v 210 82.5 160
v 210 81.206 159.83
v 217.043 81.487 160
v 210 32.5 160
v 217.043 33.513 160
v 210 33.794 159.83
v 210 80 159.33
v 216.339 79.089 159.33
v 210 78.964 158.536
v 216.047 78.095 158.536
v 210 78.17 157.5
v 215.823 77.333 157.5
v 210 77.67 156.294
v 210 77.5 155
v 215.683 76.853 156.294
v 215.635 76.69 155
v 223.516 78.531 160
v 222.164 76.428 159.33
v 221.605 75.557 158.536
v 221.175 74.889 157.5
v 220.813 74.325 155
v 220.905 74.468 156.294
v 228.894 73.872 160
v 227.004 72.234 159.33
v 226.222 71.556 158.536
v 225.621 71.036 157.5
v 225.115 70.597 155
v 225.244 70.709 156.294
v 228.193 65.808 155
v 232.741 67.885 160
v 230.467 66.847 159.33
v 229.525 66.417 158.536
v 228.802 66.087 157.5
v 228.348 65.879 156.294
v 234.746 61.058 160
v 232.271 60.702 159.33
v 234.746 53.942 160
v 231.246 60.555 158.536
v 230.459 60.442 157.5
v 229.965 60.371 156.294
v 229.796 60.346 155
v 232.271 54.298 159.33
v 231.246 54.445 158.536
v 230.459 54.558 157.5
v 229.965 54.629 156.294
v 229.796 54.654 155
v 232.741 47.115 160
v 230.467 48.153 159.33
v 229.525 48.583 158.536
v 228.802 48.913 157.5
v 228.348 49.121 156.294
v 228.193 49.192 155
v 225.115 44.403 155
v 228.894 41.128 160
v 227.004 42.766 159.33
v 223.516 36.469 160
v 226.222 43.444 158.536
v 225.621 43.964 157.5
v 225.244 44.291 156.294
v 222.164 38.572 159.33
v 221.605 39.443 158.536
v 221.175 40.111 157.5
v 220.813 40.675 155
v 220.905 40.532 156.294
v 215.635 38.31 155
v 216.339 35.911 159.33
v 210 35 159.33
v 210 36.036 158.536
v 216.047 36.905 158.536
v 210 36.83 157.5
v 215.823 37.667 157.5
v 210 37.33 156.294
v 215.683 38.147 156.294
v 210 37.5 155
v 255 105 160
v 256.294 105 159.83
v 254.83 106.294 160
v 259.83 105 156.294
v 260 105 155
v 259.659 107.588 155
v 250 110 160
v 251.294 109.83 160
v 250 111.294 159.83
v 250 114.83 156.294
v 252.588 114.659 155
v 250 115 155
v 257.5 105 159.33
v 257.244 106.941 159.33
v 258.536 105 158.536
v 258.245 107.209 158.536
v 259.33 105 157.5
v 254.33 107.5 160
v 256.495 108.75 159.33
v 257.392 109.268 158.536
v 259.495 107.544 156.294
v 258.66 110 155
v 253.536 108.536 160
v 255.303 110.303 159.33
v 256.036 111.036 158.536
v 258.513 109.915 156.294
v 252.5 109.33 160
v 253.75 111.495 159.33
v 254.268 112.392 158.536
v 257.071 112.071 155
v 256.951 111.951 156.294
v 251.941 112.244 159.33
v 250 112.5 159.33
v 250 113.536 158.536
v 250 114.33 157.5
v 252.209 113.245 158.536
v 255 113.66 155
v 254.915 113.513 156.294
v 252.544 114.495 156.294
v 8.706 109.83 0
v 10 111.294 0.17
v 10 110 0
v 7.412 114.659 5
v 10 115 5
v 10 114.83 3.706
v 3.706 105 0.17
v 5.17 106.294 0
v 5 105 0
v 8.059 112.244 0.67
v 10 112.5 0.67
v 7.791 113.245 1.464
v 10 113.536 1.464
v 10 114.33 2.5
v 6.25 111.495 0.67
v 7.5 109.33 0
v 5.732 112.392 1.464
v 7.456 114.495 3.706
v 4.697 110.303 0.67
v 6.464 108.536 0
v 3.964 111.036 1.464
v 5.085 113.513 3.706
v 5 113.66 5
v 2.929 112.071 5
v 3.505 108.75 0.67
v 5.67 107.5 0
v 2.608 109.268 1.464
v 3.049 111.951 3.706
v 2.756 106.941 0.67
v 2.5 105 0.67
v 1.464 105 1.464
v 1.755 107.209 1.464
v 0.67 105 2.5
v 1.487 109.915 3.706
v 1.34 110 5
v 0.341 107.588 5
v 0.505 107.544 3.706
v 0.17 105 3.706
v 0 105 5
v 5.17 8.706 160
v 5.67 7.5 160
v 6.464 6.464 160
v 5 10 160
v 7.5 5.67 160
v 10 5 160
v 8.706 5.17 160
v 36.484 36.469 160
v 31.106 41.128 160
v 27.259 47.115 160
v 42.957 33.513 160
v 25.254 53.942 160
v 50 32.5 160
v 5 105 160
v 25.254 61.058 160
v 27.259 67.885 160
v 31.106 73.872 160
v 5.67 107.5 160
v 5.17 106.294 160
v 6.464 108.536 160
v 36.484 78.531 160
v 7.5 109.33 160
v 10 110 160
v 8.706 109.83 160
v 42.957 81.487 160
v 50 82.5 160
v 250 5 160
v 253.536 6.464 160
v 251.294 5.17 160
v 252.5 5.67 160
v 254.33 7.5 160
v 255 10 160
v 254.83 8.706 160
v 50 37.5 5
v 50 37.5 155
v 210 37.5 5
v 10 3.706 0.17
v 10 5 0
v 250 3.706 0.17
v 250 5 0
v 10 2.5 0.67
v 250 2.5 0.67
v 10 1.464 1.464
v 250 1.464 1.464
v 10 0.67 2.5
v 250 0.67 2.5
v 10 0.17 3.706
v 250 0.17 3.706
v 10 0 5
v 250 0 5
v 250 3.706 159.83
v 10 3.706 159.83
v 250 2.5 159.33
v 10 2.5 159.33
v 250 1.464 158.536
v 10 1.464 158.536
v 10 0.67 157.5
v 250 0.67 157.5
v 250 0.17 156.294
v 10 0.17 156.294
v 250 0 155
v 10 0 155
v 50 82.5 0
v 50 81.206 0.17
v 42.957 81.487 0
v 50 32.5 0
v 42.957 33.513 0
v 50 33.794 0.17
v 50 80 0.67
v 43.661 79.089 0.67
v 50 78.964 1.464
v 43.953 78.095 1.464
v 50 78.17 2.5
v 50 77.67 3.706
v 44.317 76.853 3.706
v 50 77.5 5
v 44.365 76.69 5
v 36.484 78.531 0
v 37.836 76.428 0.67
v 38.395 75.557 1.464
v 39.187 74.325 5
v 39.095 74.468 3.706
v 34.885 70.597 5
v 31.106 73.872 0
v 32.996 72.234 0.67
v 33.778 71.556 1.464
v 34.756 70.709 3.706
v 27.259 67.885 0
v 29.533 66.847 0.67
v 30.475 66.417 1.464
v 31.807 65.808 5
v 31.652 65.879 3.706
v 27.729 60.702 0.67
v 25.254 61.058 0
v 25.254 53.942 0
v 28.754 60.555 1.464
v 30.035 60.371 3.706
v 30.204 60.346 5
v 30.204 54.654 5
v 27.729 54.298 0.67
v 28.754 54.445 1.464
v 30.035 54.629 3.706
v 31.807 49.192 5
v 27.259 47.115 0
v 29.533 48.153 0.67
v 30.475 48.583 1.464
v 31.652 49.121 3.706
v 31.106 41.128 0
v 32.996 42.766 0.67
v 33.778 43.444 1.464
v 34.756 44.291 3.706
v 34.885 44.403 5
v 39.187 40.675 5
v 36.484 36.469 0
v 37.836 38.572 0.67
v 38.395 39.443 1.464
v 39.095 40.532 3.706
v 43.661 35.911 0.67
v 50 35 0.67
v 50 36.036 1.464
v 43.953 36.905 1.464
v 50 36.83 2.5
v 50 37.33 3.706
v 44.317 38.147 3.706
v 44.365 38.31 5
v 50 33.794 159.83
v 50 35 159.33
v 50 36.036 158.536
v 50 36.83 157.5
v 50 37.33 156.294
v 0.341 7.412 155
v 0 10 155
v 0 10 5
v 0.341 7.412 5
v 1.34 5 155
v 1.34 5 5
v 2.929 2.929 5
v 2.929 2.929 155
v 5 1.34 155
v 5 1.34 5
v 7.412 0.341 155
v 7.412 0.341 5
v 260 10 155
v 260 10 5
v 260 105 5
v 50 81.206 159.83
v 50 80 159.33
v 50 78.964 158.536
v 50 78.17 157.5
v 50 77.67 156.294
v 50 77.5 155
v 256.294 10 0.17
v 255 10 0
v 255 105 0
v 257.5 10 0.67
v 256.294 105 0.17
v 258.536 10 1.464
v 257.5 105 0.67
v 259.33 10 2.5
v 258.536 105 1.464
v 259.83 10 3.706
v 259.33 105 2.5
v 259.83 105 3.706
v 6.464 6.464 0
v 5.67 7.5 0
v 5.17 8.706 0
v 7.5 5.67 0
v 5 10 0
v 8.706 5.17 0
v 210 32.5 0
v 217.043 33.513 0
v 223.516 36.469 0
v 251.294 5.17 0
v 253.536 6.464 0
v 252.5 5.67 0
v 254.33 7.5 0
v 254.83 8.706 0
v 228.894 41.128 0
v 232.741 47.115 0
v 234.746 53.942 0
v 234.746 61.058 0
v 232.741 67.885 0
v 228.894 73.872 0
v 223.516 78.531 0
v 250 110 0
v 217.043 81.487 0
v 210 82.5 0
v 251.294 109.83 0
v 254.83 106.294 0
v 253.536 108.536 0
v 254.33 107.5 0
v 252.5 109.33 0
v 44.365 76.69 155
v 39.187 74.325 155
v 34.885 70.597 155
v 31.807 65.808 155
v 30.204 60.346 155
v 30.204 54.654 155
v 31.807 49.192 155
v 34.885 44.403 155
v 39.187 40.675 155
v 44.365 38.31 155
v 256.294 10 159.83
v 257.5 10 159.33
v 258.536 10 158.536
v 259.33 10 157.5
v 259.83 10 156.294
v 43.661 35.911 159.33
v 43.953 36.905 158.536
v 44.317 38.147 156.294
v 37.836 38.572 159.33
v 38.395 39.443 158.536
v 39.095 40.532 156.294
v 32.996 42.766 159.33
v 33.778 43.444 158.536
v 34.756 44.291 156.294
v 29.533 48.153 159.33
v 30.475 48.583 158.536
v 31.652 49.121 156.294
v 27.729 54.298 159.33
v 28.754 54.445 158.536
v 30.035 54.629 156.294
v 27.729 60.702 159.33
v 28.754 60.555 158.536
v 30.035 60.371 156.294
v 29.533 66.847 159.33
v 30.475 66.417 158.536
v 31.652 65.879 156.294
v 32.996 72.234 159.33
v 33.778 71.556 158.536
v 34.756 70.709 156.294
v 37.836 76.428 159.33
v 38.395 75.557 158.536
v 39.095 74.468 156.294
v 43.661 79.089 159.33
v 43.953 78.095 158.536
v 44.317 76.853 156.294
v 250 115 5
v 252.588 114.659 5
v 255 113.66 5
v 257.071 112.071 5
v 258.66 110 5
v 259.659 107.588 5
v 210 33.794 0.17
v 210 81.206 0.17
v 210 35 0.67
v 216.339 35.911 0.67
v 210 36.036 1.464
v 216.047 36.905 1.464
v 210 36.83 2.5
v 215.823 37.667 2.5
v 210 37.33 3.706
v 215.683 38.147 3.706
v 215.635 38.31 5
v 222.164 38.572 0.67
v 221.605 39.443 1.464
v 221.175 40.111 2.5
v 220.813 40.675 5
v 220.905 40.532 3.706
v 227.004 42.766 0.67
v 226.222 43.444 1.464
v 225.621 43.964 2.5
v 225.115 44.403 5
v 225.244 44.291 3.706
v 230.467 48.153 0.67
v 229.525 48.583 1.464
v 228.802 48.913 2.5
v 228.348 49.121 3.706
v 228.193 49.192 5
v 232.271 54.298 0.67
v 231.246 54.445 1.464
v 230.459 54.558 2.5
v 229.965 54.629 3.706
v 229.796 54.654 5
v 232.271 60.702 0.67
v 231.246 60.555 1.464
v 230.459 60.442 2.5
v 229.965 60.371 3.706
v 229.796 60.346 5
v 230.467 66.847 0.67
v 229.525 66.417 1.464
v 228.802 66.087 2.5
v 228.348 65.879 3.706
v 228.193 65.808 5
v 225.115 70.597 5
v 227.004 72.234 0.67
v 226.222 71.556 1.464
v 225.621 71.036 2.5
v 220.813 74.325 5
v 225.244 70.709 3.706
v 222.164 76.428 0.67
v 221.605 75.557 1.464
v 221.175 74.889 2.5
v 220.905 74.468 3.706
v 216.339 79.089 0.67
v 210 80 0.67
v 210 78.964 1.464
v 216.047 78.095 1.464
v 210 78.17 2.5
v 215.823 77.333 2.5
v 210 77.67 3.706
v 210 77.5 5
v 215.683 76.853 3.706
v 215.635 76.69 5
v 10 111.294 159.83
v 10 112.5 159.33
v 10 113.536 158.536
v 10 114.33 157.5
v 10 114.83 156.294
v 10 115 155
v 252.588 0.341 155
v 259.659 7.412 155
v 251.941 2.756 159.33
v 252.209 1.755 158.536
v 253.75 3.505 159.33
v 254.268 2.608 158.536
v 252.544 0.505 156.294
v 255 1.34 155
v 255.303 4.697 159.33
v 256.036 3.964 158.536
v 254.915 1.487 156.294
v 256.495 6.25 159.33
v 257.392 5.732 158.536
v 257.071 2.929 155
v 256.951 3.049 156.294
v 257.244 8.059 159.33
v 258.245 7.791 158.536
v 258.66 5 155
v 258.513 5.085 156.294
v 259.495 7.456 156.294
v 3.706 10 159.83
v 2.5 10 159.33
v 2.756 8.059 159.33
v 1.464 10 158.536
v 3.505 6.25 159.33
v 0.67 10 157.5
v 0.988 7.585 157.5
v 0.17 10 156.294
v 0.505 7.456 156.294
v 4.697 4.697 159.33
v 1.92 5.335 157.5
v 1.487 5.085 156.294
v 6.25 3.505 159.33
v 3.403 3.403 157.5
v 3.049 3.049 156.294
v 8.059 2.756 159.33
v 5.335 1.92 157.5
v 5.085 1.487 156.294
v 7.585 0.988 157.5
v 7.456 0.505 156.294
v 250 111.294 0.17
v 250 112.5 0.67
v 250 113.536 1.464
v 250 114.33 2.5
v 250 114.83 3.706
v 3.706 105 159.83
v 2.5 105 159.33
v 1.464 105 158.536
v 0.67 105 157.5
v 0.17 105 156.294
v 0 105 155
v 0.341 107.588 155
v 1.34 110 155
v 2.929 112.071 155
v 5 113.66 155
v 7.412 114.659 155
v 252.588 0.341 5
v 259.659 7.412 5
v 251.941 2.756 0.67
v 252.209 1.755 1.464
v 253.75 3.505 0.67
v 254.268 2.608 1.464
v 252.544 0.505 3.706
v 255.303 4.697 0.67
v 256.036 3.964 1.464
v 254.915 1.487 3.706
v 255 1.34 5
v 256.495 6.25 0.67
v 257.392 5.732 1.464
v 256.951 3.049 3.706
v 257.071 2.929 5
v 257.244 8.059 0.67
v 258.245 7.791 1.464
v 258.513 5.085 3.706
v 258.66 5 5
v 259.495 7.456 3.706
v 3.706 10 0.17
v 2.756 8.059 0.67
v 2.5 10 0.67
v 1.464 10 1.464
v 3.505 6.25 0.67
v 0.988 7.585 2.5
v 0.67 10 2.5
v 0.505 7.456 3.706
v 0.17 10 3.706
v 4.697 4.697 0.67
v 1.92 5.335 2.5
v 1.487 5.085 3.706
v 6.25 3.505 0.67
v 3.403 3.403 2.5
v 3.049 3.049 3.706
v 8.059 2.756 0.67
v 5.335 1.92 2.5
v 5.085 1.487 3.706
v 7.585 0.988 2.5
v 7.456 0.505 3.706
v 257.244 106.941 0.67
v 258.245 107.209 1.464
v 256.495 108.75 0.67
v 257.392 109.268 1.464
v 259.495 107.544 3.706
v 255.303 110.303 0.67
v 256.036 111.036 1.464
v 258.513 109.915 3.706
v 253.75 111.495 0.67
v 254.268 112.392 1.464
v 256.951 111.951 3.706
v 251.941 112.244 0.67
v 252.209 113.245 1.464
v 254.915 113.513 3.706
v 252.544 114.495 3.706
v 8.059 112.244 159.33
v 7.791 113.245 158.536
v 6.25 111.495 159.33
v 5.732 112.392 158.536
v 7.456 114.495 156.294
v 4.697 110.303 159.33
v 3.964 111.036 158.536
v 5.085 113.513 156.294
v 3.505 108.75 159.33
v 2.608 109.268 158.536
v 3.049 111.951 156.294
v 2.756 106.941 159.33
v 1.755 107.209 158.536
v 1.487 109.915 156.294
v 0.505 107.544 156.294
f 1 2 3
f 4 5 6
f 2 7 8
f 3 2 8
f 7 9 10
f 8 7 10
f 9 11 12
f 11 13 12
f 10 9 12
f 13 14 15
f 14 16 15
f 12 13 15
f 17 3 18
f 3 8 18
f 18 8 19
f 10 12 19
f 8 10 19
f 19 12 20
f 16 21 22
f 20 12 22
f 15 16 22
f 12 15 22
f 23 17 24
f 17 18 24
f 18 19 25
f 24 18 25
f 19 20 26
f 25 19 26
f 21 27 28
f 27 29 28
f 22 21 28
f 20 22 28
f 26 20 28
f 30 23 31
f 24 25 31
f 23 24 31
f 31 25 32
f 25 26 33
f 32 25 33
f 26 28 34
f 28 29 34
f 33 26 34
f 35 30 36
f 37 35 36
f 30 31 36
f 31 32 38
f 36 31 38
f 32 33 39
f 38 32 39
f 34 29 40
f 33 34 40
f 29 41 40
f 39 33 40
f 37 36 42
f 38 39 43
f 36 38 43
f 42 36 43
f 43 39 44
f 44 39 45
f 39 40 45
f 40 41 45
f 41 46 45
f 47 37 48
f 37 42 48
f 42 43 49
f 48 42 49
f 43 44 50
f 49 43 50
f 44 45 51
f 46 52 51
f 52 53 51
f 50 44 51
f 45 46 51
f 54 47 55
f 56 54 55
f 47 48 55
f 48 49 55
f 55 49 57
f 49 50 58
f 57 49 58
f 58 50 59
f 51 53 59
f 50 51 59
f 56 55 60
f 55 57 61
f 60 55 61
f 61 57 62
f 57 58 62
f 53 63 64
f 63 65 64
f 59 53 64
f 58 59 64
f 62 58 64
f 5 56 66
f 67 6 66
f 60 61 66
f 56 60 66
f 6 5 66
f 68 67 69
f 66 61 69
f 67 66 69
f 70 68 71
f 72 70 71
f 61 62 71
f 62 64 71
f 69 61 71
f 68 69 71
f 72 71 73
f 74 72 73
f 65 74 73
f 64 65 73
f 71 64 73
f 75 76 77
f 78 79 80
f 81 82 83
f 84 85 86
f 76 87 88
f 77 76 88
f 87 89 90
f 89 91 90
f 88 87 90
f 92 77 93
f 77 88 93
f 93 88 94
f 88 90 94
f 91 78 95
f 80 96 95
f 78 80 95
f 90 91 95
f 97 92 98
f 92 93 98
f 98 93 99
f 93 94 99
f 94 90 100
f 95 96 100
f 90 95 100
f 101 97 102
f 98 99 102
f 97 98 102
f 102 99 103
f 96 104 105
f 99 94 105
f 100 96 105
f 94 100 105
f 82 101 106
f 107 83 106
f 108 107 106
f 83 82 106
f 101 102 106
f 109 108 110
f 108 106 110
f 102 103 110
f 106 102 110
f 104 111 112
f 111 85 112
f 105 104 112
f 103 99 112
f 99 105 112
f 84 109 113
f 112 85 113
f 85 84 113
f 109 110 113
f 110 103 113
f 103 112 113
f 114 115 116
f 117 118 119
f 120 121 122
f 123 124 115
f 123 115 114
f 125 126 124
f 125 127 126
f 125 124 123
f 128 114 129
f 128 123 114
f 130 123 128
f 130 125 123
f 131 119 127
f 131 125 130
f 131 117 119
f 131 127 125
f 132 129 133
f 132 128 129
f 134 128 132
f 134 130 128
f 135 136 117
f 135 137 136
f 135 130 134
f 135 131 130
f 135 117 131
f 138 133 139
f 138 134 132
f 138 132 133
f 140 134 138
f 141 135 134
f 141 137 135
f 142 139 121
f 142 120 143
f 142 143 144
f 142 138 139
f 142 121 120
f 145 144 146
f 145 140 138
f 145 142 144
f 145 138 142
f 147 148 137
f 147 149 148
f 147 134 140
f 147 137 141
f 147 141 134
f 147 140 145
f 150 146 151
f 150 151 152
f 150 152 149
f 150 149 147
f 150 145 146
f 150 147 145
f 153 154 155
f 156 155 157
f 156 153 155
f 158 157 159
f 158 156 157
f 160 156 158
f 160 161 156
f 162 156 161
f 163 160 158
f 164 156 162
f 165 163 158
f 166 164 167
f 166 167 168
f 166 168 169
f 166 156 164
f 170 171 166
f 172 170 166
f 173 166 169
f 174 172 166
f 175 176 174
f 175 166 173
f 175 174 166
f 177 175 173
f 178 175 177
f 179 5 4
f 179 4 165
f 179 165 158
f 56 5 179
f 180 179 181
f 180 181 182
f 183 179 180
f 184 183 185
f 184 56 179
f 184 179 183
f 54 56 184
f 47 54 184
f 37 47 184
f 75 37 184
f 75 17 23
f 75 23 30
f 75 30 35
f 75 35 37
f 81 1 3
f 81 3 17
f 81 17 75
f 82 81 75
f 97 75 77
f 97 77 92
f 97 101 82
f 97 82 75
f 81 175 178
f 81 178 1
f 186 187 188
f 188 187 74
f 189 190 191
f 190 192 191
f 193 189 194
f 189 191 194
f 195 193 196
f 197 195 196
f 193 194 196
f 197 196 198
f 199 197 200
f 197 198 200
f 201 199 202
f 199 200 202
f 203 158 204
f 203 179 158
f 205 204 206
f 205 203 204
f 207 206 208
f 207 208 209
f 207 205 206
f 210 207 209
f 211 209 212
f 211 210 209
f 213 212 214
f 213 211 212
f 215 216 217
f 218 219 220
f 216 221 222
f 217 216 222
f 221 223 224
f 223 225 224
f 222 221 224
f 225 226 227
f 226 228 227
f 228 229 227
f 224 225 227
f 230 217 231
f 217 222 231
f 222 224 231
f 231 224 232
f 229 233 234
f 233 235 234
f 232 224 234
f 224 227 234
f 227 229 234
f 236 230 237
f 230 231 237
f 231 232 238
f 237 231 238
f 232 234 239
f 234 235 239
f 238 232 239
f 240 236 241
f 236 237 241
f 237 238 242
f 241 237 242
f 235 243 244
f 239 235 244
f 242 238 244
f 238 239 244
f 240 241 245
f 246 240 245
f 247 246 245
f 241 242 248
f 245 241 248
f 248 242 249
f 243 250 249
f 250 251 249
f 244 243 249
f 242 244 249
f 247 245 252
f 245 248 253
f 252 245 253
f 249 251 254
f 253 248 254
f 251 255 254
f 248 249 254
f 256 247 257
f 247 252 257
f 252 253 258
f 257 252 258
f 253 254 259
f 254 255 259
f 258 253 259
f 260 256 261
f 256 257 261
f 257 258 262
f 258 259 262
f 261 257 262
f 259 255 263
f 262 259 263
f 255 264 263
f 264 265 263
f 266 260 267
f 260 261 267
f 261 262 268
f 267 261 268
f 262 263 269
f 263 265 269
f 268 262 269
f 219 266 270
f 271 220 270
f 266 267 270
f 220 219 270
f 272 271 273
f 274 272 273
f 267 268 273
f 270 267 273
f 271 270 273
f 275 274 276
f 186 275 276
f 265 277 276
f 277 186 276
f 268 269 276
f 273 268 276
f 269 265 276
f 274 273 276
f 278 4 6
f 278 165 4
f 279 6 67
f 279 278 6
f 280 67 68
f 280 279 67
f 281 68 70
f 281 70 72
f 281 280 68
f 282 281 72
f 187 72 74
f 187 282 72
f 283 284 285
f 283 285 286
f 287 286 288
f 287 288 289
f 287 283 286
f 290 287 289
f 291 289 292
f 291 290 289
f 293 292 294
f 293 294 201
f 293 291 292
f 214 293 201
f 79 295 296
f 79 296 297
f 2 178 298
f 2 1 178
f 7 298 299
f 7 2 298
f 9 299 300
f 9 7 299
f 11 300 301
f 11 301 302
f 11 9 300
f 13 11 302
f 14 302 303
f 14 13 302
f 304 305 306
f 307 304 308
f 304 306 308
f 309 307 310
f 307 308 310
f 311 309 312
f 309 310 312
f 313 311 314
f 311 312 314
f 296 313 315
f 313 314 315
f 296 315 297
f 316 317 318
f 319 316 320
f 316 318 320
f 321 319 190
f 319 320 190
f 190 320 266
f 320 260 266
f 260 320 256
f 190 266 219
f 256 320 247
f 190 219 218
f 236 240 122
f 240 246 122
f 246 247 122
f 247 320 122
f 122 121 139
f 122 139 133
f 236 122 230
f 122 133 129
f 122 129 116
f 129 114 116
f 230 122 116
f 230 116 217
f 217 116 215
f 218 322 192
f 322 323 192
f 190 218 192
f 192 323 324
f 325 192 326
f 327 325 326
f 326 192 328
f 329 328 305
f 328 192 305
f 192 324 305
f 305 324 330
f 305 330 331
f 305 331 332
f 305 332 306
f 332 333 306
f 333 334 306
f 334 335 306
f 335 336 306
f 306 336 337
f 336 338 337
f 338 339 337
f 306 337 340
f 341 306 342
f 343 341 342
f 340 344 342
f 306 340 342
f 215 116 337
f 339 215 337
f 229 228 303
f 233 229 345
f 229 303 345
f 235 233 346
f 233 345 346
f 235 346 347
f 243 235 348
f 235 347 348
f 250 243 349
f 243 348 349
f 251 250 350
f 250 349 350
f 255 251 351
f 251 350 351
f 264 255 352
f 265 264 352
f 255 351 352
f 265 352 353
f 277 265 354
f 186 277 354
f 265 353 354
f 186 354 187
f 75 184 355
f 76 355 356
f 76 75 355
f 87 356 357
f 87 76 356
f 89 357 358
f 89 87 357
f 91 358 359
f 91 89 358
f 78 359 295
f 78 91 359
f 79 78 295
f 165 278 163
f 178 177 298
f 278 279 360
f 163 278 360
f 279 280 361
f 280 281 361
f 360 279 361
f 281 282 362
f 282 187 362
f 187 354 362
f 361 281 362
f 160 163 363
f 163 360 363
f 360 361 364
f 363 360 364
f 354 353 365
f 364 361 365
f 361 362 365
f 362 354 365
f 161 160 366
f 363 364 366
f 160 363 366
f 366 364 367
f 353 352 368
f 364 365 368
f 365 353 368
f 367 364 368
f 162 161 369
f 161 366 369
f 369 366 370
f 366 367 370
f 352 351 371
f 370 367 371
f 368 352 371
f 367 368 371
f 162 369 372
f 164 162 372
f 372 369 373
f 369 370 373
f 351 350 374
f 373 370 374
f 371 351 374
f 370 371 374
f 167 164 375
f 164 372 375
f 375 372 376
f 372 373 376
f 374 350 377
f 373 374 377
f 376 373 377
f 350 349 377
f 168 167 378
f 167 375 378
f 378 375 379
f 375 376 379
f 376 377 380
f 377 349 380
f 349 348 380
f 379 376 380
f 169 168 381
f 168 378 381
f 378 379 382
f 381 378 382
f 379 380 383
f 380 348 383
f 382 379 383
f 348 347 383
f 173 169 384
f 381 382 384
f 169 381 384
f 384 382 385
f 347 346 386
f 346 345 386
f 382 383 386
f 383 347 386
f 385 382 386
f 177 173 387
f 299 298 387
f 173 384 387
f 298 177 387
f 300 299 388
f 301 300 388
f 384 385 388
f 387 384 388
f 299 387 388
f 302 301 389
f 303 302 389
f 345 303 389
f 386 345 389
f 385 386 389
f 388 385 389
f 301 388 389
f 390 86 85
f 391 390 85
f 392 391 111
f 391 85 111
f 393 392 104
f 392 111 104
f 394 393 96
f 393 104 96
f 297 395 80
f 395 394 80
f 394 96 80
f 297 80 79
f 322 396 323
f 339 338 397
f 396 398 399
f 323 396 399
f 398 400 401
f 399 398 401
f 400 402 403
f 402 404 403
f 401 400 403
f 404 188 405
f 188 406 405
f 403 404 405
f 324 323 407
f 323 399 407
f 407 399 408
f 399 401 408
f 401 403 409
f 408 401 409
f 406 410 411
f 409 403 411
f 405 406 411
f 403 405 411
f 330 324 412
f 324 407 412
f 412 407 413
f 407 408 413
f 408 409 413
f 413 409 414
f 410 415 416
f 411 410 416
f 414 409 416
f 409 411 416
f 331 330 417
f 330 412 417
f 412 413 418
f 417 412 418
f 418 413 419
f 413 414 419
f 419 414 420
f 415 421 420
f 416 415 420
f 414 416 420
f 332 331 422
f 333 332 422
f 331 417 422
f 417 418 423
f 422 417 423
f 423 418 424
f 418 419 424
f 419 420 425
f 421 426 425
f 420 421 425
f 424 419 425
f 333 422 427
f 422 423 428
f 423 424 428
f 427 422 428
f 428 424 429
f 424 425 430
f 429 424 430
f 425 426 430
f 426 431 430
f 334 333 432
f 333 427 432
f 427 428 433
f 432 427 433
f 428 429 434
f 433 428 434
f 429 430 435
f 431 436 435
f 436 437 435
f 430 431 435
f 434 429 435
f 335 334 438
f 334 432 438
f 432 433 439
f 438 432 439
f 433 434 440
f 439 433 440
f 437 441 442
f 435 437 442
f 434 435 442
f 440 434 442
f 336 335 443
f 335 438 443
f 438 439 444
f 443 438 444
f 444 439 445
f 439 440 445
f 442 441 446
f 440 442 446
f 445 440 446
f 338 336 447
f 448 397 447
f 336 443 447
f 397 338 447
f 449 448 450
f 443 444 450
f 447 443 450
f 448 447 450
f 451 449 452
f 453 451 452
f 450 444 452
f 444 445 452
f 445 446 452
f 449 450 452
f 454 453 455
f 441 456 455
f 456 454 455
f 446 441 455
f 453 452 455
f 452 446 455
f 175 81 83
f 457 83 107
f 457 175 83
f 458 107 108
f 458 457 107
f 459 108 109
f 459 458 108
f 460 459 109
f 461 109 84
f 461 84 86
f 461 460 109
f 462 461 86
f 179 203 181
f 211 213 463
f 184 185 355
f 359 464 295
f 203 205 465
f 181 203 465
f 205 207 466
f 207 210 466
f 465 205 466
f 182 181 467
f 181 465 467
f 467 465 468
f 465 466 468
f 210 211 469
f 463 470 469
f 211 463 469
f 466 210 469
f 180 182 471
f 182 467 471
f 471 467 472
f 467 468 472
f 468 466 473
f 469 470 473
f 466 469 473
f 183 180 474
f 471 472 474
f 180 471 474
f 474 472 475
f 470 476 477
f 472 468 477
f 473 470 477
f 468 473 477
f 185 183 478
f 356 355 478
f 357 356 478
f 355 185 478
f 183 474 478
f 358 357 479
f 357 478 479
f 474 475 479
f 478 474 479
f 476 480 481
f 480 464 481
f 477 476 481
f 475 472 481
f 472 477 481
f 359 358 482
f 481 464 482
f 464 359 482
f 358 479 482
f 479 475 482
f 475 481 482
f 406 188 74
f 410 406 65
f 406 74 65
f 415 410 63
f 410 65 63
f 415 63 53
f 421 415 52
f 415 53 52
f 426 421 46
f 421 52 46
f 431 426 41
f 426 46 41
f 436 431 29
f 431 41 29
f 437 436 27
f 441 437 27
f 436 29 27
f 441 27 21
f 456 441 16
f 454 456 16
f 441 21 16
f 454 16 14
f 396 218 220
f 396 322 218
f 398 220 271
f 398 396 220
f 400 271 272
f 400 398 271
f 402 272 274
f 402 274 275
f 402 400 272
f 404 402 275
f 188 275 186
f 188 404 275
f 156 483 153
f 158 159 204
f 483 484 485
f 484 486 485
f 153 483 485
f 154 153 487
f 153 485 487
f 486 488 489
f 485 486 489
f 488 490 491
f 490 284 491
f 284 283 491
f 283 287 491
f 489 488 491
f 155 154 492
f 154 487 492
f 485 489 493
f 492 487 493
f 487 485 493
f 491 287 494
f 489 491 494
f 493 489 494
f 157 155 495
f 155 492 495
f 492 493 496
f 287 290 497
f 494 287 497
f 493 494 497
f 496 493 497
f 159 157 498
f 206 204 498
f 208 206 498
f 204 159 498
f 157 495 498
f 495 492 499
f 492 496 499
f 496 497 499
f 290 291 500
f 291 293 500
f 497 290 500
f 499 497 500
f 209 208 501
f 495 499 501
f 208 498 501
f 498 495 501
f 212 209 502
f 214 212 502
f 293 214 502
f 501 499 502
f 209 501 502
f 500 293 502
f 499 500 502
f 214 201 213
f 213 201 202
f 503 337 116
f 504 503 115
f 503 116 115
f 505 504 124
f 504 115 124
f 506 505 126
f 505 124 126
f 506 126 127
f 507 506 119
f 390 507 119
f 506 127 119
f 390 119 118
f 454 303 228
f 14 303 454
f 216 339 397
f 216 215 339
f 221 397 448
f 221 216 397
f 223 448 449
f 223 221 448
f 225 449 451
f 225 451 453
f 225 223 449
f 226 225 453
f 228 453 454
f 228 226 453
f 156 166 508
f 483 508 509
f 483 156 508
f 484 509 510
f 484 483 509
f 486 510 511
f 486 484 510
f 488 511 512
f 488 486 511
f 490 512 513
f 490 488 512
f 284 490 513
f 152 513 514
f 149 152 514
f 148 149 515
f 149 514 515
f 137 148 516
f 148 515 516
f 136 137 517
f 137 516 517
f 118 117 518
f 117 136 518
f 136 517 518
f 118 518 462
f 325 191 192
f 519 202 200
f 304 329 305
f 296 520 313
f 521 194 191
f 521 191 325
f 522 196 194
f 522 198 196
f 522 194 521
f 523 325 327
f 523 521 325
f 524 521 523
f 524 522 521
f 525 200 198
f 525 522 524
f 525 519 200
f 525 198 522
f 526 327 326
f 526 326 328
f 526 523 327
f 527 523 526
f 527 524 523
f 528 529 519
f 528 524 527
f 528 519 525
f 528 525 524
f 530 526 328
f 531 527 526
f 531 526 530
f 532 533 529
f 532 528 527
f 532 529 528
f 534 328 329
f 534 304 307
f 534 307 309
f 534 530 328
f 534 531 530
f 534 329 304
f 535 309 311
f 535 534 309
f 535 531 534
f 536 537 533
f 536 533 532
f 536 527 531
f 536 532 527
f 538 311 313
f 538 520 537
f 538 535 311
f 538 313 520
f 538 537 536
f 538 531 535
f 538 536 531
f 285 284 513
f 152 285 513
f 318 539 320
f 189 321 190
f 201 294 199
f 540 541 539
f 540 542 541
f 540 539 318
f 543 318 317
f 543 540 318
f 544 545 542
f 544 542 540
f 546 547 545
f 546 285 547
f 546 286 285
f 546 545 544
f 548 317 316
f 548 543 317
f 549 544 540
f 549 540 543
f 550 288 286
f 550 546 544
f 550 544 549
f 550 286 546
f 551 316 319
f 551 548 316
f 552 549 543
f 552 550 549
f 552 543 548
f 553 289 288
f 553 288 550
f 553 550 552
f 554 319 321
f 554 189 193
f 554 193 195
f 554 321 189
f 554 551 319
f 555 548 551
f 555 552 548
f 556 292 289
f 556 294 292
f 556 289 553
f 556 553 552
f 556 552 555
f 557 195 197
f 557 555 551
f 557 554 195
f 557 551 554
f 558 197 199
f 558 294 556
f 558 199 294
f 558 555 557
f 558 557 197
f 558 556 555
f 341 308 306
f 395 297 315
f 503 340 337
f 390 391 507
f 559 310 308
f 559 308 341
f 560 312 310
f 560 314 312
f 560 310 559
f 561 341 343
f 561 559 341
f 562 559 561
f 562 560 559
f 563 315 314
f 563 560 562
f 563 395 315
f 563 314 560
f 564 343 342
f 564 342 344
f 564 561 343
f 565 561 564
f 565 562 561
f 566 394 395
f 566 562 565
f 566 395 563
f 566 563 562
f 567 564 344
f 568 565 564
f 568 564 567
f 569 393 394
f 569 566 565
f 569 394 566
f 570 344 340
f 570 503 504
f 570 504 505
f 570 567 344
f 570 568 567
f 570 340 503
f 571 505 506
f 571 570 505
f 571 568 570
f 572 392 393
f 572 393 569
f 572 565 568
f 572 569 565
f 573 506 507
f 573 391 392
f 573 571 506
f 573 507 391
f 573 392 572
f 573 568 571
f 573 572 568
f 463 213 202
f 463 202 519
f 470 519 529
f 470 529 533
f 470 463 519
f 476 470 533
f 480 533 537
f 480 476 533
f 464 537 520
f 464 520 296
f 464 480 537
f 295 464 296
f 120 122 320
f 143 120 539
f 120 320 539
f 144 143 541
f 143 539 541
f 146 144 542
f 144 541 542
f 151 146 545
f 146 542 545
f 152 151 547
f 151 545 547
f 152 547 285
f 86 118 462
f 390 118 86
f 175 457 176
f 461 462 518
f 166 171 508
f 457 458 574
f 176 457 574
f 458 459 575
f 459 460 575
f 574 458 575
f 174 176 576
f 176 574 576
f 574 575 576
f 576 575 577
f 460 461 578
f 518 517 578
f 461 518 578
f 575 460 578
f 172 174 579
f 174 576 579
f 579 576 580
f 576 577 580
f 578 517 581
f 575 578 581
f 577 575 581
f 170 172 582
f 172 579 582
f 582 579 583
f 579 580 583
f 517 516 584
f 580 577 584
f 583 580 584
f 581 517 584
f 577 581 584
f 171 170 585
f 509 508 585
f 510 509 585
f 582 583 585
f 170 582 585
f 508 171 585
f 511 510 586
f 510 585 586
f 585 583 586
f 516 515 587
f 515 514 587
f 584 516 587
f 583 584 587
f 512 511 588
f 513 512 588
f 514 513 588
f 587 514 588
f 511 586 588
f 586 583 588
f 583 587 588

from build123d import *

# Parameters (mm, degrees)
SKETCH_W     = 260
SKETCH_H     = 115
PAD_DEPTH    = 160
POCKET_DEPTH = 160.001
FILLET_R     = 10
FILLET001_R  = 5


with BuildPart() as part:
    # Sketch → Pad (new body)
    with BuildSketch(Plane.XY):
        with Locations((130, 57.5)):
            Rectangle(SKETCH_W, SKETCH_H)
    extrude(amount=PAD_DEPTH)

    # Sketch001 → Pocket (cut, through all)
    with BuildSketch(Plane.XY.offset(160)):
        with BuildLine():
            ThreePointArc((50, 77.5), (30, 57.5), (50, 37.5))
            Line((50, 37.5), (210, 37.5))
            ThreePointArc((210, 37.5), (230, 57.5), (210, 77.5))
            Line((50, 77.5), (210, 77.5))
        make_face()
    extrude(amount=-POCKET_DEPTH, mode=Mode.SUBTRACT)

    # Fillet
    fillet_edges = [part.edges().sort_by_distance(p)[0] for p in [
        (0, 0, 80),
        (0, 115, 80),
        (260, 0, 80),
        (260, 115, 80),
    ]]
    fillet(fillet_edges, radius=FILLET_R)

    # Fillet001
    fillet001_edges = [part.edges().sort_by_distance(p)[0] for p in [
        (130, 0, 0),
        (2.928932, 2.928932, 0),
        (257.071068, 2.928932, 0),
        (0, 57.5, 0),
        (260, 57.5, 0),
        (2.928932, 112.071068, 0),
        (257.071068, 112.071068, 0),
        (130, 115, 0),
        (130, 37.5, 0),
        (30, 57.5, 0),
        (130, 77.5, 0),
        (230, 57.5, 0),
        (130, 0, 160),
        (2.928932, 2.928932, 160),
        (257.071068, 2.928932, 160),
        (0, 57.5, 160),
        (260, 57.5, 160),
        (2.928932, 112.071068, 160),
        (257.071068, 112.071068, 160),
        (130, 115, 160),
        (130, 77.5, 160),
        (230, 57.5, 160),
        (130, 37.5, 160),
        (30, 57.5, 160),
    ]]
    fillet(fillet001_edges, radius=FILLET001_R)


solid = part.part
